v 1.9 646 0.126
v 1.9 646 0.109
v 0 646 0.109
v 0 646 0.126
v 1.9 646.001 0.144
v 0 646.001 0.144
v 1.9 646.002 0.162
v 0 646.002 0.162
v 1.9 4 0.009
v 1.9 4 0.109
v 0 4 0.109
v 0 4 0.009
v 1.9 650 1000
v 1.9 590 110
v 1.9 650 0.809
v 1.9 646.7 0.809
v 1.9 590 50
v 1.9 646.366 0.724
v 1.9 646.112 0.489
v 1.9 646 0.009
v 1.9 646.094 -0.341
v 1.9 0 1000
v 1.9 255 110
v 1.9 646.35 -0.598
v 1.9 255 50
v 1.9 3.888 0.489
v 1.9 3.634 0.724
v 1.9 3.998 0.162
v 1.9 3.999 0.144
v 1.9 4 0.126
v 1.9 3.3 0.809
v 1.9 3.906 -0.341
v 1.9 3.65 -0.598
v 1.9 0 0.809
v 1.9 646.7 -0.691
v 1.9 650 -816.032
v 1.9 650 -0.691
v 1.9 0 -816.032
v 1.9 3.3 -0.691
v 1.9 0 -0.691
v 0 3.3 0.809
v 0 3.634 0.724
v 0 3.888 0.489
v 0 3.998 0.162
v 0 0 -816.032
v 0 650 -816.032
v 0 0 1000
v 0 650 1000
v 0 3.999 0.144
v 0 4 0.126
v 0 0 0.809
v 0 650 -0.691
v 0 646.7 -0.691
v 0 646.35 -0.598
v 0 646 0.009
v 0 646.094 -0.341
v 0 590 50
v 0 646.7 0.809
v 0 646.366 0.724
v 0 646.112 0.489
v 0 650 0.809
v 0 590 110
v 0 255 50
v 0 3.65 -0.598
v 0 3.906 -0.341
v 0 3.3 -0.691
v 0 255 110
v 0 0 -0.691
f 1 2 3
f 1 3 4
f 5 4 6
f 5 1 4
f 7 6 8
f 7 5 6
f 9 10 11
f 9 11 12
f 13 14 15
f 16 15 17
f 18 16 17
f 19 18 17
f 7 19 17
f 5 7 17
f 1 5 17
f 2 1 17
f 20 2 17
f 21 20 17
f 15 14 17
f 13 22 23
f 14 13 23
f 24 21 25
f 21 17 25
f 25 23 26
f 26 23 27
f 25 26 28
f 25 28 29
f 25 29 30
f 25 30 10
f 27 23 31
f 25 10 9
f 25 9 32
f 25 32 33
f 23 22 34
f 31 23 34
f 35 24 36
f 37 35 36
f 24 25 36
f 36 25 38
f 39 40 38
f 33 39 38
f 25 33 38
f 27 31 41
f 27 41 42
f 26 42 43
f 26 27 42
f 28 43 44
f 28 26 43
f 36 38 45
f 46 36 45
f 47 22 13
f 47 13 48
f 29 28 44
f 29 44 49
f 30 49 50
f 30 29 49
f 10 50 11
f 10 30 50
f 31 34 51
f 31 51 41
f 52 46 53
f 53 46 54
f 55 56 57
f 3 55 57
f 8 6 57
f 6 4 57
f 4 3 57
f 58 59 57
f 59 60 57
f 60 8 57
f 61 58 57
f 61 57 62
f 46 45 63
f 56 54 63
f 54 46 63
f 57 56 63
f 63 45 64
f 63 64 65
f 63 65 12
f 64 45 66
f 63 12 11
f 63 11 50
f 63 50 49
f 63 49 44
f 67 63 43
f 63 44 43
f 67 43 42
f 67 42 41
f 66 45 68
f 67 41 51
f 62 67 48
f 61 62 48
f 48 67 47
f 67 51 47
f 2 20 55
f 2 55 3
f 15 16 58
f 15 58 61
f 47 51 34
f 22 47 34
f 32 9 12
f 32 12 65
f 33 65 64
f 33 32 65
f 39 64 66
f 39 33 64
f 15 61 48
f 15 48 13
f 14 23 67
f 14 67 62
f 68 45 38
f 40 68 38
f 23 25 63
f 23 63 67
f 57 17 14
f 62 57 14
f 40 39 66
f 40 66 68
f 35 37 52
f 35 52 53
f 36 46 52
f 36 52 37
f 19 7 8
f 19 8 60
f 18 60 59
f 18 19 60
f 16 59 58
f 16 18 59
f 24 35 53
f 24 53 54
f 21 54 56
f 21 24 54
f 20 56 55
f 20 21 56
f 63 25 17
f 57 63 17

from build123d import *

# Parameters (mm, degrees)
BRIDA_BASE2_DEPTH          = 650
CORTAR_EXTRUIR1_DEPTH      = 1198.029946406
CORTAR_EXTRUIR1_DEPTH_BACK = 1198.029946406
CROQUIS11_W                = 60
CROQUIS11_H                = 335
DESDOBLAR2_DEPTH           = 650
DESDOBLAR2_2_DEPTH         = 650
CORTAR_EXTRUIR2_DEPTH      = 1193.687557577
CORTAR_EXTRUIR2_DEPTH_BACK = 1193.687557577


# Read off the part's stored shape, not the designer's step: Desdoblar2
# Sheet-metal steps are written as plain solids
with BuildPart() as part:
    # Croquis1 → Brida base2 (new body)
    with BuildSketch(Plane(origin=(0, 0, 0), x_dir=(1, 0, 0), z_dir=(0, 1, 0))):
        with BuildLine():
            Line((0, -1000), (0, -0.162137614))
            ThreePointArc((0, -0.162137614), (0.004971228, -0.000305705), (0.019866166, 0.160915945))
            Line((0.019866166, 0.160915945), (100, 810))
            Line((100, 810), (101.885683943, 809.767199513))
            Line((101.885683943, 809.767199513), (1.905550109, -0.071884541))
            ThreePointArc((1.905550109, -0.071884541), (1.901388837, -0.116925833), (1.9, -0.162137614))
            Line((1.9, -0.162137614), (1.9, -1000))
            Line((1.9, -1000), (0, -1000))
        make_face()
    extrude(amount=BRIDA_BASE2_DEPTH)

    # Croquis11 → Cortar-Extruir1 (cut, two sides: drawn at the far end of the back side and taken through both)
    with BuildSketch(Plane.ZY.offset(-CORTAR_EXTRUIR1_DEPTH_BACK)):
        with Locations((80, 422.5)):
            Rectangle(CROQUIS11_W, CROQUIS11_H)
    extrude(amount=CORTAR_EXTRUIR1_DEPTH + CORTAR_EXTRUIR1_DEPTH_BACK, mode=Mode.SUBTRACT)

    # Desdoblar2 outline → Desdoblar2 (cut)
    with BuildSketch(Plane(origin=(0, 0, 0), x_dir=(1, 0, 0), z_dir=(0, 1, 0))):
        with BuildLine():
            Line((100, 810), (1.9, 15.39))
            Line((1.9, 15.39), (1.9, -0.162137614))
            ThreePointArc((1.9, -0.162137614), (1.901388837, -0.116925832), (1.905550109, -0.071884541))
            Line((1.905550109, -0.071884541), (101.885683943, 809.767199513))
            Line((101.885683943, 809.767199513), (100, 810))
        make_face()
    extrude(amount=DESDOBLAR2_DEPTH, mode=Mode.SUBTRACT)

    # Desdoblar2 2 outline → Desdoblar2 2 (add)
    with BuildSketch(Plane(origin=(0, 0, 0), x_dir=(1, 0, 0), z_dir=(0, 1, 0))):
        with BuildLine():
            Line((1.9, 15.39), (1.9, 816.032394795))
            Line((1.9, 816.032394795), (0, 816.032394795))
            Line((0, 816.032394795), (0, -0.162137614))
            ThreePointArc((0, -0.162137614), (0.004971228, -0.000305705), (0.019866166, 0.160915945))
            Line((0.019866166, 0.160915945), (1.9, 15.39))
        make_face()
    extrude(amount=DESDOBLAR2_2_DEPTH)

    # Croquis12 → Cortar-Extruir2 (cut, two sides: drawn at the far end of the back side and taken through both)
    with BuildSketch(Plane.ZY.offset(-CORTAR_EXTRUIR2_DEPTH_BACK)):
        with BuildLine():
            ThreePointArc((0.108550657, 646), (0.135363814, 646.000513721), (0.162137614, 646.00205413))
            Line((0.162137614, 646.00205413), (0.162137614, 650))
            Line((0.162137614, 650), (-0.691449343, 650))
            Line((-0.691449343, 650), (-0.691449343, 646.7))
            ThreePointArc((-0.691449343, 646.7), (-0.486424089, 646.205025253), (0.008550657, 646))
            Line((0.008550657, 646), (0.108550657, 646))
        make_face()
        with BuildLine():
            Line((0.162137614, 650), (0.162137614, 646.00205413))
            ThreePointArc((0.162137614, 646.00205413), (0.622121913, 646.224348273), (0.808550657, 646.7))
            Line((0.808550657, 646.7), (0.808550657, 650))
            Line((0.808550657, 650), (0.162137614, 650))
        make_face()
        with BuildLine():
            Line((-0.691449343, 0), (-0.045036299, 0))
            Line((-0.045036299, 0), (0.162137614, 0))
            Line((0.162137614, 0), (0.162137614, 3.99794587))
            ThreePointArc((0.162137614, 3.99794587), (0.135363814, 3.999486279), (0.108550657, 4))
            Line((0.108550657, 4), (0.008550657, 4))
            ThreePointArc((0.008550657, 4), (-0.486424089, 3.794974747), (-0.691449343, 3.3))
            Line((-0.691449343, 3.3), (-0.691449343, 0))
        make_face()
        with BuildLine():
            Line((0.162137614, 3.99794587), (0.162137614, 0))
            Line((0.162137614, 0), (0.808550657, 0))
            Line((0.808550657, 0), (0.808550657, 3.3))
            ThreePointArc((0.808550657, 3.3), (0.622121913, 3.775651727), (0.162137614, 3.99794587))
        make_face()
    extrude(amount=CORTAR_EXTRUIR2_DEPTH + CORTAR_EXTRUIR2_DEPTH_BACK, mode=Mode.SUBTRACT)


solid = part.part
